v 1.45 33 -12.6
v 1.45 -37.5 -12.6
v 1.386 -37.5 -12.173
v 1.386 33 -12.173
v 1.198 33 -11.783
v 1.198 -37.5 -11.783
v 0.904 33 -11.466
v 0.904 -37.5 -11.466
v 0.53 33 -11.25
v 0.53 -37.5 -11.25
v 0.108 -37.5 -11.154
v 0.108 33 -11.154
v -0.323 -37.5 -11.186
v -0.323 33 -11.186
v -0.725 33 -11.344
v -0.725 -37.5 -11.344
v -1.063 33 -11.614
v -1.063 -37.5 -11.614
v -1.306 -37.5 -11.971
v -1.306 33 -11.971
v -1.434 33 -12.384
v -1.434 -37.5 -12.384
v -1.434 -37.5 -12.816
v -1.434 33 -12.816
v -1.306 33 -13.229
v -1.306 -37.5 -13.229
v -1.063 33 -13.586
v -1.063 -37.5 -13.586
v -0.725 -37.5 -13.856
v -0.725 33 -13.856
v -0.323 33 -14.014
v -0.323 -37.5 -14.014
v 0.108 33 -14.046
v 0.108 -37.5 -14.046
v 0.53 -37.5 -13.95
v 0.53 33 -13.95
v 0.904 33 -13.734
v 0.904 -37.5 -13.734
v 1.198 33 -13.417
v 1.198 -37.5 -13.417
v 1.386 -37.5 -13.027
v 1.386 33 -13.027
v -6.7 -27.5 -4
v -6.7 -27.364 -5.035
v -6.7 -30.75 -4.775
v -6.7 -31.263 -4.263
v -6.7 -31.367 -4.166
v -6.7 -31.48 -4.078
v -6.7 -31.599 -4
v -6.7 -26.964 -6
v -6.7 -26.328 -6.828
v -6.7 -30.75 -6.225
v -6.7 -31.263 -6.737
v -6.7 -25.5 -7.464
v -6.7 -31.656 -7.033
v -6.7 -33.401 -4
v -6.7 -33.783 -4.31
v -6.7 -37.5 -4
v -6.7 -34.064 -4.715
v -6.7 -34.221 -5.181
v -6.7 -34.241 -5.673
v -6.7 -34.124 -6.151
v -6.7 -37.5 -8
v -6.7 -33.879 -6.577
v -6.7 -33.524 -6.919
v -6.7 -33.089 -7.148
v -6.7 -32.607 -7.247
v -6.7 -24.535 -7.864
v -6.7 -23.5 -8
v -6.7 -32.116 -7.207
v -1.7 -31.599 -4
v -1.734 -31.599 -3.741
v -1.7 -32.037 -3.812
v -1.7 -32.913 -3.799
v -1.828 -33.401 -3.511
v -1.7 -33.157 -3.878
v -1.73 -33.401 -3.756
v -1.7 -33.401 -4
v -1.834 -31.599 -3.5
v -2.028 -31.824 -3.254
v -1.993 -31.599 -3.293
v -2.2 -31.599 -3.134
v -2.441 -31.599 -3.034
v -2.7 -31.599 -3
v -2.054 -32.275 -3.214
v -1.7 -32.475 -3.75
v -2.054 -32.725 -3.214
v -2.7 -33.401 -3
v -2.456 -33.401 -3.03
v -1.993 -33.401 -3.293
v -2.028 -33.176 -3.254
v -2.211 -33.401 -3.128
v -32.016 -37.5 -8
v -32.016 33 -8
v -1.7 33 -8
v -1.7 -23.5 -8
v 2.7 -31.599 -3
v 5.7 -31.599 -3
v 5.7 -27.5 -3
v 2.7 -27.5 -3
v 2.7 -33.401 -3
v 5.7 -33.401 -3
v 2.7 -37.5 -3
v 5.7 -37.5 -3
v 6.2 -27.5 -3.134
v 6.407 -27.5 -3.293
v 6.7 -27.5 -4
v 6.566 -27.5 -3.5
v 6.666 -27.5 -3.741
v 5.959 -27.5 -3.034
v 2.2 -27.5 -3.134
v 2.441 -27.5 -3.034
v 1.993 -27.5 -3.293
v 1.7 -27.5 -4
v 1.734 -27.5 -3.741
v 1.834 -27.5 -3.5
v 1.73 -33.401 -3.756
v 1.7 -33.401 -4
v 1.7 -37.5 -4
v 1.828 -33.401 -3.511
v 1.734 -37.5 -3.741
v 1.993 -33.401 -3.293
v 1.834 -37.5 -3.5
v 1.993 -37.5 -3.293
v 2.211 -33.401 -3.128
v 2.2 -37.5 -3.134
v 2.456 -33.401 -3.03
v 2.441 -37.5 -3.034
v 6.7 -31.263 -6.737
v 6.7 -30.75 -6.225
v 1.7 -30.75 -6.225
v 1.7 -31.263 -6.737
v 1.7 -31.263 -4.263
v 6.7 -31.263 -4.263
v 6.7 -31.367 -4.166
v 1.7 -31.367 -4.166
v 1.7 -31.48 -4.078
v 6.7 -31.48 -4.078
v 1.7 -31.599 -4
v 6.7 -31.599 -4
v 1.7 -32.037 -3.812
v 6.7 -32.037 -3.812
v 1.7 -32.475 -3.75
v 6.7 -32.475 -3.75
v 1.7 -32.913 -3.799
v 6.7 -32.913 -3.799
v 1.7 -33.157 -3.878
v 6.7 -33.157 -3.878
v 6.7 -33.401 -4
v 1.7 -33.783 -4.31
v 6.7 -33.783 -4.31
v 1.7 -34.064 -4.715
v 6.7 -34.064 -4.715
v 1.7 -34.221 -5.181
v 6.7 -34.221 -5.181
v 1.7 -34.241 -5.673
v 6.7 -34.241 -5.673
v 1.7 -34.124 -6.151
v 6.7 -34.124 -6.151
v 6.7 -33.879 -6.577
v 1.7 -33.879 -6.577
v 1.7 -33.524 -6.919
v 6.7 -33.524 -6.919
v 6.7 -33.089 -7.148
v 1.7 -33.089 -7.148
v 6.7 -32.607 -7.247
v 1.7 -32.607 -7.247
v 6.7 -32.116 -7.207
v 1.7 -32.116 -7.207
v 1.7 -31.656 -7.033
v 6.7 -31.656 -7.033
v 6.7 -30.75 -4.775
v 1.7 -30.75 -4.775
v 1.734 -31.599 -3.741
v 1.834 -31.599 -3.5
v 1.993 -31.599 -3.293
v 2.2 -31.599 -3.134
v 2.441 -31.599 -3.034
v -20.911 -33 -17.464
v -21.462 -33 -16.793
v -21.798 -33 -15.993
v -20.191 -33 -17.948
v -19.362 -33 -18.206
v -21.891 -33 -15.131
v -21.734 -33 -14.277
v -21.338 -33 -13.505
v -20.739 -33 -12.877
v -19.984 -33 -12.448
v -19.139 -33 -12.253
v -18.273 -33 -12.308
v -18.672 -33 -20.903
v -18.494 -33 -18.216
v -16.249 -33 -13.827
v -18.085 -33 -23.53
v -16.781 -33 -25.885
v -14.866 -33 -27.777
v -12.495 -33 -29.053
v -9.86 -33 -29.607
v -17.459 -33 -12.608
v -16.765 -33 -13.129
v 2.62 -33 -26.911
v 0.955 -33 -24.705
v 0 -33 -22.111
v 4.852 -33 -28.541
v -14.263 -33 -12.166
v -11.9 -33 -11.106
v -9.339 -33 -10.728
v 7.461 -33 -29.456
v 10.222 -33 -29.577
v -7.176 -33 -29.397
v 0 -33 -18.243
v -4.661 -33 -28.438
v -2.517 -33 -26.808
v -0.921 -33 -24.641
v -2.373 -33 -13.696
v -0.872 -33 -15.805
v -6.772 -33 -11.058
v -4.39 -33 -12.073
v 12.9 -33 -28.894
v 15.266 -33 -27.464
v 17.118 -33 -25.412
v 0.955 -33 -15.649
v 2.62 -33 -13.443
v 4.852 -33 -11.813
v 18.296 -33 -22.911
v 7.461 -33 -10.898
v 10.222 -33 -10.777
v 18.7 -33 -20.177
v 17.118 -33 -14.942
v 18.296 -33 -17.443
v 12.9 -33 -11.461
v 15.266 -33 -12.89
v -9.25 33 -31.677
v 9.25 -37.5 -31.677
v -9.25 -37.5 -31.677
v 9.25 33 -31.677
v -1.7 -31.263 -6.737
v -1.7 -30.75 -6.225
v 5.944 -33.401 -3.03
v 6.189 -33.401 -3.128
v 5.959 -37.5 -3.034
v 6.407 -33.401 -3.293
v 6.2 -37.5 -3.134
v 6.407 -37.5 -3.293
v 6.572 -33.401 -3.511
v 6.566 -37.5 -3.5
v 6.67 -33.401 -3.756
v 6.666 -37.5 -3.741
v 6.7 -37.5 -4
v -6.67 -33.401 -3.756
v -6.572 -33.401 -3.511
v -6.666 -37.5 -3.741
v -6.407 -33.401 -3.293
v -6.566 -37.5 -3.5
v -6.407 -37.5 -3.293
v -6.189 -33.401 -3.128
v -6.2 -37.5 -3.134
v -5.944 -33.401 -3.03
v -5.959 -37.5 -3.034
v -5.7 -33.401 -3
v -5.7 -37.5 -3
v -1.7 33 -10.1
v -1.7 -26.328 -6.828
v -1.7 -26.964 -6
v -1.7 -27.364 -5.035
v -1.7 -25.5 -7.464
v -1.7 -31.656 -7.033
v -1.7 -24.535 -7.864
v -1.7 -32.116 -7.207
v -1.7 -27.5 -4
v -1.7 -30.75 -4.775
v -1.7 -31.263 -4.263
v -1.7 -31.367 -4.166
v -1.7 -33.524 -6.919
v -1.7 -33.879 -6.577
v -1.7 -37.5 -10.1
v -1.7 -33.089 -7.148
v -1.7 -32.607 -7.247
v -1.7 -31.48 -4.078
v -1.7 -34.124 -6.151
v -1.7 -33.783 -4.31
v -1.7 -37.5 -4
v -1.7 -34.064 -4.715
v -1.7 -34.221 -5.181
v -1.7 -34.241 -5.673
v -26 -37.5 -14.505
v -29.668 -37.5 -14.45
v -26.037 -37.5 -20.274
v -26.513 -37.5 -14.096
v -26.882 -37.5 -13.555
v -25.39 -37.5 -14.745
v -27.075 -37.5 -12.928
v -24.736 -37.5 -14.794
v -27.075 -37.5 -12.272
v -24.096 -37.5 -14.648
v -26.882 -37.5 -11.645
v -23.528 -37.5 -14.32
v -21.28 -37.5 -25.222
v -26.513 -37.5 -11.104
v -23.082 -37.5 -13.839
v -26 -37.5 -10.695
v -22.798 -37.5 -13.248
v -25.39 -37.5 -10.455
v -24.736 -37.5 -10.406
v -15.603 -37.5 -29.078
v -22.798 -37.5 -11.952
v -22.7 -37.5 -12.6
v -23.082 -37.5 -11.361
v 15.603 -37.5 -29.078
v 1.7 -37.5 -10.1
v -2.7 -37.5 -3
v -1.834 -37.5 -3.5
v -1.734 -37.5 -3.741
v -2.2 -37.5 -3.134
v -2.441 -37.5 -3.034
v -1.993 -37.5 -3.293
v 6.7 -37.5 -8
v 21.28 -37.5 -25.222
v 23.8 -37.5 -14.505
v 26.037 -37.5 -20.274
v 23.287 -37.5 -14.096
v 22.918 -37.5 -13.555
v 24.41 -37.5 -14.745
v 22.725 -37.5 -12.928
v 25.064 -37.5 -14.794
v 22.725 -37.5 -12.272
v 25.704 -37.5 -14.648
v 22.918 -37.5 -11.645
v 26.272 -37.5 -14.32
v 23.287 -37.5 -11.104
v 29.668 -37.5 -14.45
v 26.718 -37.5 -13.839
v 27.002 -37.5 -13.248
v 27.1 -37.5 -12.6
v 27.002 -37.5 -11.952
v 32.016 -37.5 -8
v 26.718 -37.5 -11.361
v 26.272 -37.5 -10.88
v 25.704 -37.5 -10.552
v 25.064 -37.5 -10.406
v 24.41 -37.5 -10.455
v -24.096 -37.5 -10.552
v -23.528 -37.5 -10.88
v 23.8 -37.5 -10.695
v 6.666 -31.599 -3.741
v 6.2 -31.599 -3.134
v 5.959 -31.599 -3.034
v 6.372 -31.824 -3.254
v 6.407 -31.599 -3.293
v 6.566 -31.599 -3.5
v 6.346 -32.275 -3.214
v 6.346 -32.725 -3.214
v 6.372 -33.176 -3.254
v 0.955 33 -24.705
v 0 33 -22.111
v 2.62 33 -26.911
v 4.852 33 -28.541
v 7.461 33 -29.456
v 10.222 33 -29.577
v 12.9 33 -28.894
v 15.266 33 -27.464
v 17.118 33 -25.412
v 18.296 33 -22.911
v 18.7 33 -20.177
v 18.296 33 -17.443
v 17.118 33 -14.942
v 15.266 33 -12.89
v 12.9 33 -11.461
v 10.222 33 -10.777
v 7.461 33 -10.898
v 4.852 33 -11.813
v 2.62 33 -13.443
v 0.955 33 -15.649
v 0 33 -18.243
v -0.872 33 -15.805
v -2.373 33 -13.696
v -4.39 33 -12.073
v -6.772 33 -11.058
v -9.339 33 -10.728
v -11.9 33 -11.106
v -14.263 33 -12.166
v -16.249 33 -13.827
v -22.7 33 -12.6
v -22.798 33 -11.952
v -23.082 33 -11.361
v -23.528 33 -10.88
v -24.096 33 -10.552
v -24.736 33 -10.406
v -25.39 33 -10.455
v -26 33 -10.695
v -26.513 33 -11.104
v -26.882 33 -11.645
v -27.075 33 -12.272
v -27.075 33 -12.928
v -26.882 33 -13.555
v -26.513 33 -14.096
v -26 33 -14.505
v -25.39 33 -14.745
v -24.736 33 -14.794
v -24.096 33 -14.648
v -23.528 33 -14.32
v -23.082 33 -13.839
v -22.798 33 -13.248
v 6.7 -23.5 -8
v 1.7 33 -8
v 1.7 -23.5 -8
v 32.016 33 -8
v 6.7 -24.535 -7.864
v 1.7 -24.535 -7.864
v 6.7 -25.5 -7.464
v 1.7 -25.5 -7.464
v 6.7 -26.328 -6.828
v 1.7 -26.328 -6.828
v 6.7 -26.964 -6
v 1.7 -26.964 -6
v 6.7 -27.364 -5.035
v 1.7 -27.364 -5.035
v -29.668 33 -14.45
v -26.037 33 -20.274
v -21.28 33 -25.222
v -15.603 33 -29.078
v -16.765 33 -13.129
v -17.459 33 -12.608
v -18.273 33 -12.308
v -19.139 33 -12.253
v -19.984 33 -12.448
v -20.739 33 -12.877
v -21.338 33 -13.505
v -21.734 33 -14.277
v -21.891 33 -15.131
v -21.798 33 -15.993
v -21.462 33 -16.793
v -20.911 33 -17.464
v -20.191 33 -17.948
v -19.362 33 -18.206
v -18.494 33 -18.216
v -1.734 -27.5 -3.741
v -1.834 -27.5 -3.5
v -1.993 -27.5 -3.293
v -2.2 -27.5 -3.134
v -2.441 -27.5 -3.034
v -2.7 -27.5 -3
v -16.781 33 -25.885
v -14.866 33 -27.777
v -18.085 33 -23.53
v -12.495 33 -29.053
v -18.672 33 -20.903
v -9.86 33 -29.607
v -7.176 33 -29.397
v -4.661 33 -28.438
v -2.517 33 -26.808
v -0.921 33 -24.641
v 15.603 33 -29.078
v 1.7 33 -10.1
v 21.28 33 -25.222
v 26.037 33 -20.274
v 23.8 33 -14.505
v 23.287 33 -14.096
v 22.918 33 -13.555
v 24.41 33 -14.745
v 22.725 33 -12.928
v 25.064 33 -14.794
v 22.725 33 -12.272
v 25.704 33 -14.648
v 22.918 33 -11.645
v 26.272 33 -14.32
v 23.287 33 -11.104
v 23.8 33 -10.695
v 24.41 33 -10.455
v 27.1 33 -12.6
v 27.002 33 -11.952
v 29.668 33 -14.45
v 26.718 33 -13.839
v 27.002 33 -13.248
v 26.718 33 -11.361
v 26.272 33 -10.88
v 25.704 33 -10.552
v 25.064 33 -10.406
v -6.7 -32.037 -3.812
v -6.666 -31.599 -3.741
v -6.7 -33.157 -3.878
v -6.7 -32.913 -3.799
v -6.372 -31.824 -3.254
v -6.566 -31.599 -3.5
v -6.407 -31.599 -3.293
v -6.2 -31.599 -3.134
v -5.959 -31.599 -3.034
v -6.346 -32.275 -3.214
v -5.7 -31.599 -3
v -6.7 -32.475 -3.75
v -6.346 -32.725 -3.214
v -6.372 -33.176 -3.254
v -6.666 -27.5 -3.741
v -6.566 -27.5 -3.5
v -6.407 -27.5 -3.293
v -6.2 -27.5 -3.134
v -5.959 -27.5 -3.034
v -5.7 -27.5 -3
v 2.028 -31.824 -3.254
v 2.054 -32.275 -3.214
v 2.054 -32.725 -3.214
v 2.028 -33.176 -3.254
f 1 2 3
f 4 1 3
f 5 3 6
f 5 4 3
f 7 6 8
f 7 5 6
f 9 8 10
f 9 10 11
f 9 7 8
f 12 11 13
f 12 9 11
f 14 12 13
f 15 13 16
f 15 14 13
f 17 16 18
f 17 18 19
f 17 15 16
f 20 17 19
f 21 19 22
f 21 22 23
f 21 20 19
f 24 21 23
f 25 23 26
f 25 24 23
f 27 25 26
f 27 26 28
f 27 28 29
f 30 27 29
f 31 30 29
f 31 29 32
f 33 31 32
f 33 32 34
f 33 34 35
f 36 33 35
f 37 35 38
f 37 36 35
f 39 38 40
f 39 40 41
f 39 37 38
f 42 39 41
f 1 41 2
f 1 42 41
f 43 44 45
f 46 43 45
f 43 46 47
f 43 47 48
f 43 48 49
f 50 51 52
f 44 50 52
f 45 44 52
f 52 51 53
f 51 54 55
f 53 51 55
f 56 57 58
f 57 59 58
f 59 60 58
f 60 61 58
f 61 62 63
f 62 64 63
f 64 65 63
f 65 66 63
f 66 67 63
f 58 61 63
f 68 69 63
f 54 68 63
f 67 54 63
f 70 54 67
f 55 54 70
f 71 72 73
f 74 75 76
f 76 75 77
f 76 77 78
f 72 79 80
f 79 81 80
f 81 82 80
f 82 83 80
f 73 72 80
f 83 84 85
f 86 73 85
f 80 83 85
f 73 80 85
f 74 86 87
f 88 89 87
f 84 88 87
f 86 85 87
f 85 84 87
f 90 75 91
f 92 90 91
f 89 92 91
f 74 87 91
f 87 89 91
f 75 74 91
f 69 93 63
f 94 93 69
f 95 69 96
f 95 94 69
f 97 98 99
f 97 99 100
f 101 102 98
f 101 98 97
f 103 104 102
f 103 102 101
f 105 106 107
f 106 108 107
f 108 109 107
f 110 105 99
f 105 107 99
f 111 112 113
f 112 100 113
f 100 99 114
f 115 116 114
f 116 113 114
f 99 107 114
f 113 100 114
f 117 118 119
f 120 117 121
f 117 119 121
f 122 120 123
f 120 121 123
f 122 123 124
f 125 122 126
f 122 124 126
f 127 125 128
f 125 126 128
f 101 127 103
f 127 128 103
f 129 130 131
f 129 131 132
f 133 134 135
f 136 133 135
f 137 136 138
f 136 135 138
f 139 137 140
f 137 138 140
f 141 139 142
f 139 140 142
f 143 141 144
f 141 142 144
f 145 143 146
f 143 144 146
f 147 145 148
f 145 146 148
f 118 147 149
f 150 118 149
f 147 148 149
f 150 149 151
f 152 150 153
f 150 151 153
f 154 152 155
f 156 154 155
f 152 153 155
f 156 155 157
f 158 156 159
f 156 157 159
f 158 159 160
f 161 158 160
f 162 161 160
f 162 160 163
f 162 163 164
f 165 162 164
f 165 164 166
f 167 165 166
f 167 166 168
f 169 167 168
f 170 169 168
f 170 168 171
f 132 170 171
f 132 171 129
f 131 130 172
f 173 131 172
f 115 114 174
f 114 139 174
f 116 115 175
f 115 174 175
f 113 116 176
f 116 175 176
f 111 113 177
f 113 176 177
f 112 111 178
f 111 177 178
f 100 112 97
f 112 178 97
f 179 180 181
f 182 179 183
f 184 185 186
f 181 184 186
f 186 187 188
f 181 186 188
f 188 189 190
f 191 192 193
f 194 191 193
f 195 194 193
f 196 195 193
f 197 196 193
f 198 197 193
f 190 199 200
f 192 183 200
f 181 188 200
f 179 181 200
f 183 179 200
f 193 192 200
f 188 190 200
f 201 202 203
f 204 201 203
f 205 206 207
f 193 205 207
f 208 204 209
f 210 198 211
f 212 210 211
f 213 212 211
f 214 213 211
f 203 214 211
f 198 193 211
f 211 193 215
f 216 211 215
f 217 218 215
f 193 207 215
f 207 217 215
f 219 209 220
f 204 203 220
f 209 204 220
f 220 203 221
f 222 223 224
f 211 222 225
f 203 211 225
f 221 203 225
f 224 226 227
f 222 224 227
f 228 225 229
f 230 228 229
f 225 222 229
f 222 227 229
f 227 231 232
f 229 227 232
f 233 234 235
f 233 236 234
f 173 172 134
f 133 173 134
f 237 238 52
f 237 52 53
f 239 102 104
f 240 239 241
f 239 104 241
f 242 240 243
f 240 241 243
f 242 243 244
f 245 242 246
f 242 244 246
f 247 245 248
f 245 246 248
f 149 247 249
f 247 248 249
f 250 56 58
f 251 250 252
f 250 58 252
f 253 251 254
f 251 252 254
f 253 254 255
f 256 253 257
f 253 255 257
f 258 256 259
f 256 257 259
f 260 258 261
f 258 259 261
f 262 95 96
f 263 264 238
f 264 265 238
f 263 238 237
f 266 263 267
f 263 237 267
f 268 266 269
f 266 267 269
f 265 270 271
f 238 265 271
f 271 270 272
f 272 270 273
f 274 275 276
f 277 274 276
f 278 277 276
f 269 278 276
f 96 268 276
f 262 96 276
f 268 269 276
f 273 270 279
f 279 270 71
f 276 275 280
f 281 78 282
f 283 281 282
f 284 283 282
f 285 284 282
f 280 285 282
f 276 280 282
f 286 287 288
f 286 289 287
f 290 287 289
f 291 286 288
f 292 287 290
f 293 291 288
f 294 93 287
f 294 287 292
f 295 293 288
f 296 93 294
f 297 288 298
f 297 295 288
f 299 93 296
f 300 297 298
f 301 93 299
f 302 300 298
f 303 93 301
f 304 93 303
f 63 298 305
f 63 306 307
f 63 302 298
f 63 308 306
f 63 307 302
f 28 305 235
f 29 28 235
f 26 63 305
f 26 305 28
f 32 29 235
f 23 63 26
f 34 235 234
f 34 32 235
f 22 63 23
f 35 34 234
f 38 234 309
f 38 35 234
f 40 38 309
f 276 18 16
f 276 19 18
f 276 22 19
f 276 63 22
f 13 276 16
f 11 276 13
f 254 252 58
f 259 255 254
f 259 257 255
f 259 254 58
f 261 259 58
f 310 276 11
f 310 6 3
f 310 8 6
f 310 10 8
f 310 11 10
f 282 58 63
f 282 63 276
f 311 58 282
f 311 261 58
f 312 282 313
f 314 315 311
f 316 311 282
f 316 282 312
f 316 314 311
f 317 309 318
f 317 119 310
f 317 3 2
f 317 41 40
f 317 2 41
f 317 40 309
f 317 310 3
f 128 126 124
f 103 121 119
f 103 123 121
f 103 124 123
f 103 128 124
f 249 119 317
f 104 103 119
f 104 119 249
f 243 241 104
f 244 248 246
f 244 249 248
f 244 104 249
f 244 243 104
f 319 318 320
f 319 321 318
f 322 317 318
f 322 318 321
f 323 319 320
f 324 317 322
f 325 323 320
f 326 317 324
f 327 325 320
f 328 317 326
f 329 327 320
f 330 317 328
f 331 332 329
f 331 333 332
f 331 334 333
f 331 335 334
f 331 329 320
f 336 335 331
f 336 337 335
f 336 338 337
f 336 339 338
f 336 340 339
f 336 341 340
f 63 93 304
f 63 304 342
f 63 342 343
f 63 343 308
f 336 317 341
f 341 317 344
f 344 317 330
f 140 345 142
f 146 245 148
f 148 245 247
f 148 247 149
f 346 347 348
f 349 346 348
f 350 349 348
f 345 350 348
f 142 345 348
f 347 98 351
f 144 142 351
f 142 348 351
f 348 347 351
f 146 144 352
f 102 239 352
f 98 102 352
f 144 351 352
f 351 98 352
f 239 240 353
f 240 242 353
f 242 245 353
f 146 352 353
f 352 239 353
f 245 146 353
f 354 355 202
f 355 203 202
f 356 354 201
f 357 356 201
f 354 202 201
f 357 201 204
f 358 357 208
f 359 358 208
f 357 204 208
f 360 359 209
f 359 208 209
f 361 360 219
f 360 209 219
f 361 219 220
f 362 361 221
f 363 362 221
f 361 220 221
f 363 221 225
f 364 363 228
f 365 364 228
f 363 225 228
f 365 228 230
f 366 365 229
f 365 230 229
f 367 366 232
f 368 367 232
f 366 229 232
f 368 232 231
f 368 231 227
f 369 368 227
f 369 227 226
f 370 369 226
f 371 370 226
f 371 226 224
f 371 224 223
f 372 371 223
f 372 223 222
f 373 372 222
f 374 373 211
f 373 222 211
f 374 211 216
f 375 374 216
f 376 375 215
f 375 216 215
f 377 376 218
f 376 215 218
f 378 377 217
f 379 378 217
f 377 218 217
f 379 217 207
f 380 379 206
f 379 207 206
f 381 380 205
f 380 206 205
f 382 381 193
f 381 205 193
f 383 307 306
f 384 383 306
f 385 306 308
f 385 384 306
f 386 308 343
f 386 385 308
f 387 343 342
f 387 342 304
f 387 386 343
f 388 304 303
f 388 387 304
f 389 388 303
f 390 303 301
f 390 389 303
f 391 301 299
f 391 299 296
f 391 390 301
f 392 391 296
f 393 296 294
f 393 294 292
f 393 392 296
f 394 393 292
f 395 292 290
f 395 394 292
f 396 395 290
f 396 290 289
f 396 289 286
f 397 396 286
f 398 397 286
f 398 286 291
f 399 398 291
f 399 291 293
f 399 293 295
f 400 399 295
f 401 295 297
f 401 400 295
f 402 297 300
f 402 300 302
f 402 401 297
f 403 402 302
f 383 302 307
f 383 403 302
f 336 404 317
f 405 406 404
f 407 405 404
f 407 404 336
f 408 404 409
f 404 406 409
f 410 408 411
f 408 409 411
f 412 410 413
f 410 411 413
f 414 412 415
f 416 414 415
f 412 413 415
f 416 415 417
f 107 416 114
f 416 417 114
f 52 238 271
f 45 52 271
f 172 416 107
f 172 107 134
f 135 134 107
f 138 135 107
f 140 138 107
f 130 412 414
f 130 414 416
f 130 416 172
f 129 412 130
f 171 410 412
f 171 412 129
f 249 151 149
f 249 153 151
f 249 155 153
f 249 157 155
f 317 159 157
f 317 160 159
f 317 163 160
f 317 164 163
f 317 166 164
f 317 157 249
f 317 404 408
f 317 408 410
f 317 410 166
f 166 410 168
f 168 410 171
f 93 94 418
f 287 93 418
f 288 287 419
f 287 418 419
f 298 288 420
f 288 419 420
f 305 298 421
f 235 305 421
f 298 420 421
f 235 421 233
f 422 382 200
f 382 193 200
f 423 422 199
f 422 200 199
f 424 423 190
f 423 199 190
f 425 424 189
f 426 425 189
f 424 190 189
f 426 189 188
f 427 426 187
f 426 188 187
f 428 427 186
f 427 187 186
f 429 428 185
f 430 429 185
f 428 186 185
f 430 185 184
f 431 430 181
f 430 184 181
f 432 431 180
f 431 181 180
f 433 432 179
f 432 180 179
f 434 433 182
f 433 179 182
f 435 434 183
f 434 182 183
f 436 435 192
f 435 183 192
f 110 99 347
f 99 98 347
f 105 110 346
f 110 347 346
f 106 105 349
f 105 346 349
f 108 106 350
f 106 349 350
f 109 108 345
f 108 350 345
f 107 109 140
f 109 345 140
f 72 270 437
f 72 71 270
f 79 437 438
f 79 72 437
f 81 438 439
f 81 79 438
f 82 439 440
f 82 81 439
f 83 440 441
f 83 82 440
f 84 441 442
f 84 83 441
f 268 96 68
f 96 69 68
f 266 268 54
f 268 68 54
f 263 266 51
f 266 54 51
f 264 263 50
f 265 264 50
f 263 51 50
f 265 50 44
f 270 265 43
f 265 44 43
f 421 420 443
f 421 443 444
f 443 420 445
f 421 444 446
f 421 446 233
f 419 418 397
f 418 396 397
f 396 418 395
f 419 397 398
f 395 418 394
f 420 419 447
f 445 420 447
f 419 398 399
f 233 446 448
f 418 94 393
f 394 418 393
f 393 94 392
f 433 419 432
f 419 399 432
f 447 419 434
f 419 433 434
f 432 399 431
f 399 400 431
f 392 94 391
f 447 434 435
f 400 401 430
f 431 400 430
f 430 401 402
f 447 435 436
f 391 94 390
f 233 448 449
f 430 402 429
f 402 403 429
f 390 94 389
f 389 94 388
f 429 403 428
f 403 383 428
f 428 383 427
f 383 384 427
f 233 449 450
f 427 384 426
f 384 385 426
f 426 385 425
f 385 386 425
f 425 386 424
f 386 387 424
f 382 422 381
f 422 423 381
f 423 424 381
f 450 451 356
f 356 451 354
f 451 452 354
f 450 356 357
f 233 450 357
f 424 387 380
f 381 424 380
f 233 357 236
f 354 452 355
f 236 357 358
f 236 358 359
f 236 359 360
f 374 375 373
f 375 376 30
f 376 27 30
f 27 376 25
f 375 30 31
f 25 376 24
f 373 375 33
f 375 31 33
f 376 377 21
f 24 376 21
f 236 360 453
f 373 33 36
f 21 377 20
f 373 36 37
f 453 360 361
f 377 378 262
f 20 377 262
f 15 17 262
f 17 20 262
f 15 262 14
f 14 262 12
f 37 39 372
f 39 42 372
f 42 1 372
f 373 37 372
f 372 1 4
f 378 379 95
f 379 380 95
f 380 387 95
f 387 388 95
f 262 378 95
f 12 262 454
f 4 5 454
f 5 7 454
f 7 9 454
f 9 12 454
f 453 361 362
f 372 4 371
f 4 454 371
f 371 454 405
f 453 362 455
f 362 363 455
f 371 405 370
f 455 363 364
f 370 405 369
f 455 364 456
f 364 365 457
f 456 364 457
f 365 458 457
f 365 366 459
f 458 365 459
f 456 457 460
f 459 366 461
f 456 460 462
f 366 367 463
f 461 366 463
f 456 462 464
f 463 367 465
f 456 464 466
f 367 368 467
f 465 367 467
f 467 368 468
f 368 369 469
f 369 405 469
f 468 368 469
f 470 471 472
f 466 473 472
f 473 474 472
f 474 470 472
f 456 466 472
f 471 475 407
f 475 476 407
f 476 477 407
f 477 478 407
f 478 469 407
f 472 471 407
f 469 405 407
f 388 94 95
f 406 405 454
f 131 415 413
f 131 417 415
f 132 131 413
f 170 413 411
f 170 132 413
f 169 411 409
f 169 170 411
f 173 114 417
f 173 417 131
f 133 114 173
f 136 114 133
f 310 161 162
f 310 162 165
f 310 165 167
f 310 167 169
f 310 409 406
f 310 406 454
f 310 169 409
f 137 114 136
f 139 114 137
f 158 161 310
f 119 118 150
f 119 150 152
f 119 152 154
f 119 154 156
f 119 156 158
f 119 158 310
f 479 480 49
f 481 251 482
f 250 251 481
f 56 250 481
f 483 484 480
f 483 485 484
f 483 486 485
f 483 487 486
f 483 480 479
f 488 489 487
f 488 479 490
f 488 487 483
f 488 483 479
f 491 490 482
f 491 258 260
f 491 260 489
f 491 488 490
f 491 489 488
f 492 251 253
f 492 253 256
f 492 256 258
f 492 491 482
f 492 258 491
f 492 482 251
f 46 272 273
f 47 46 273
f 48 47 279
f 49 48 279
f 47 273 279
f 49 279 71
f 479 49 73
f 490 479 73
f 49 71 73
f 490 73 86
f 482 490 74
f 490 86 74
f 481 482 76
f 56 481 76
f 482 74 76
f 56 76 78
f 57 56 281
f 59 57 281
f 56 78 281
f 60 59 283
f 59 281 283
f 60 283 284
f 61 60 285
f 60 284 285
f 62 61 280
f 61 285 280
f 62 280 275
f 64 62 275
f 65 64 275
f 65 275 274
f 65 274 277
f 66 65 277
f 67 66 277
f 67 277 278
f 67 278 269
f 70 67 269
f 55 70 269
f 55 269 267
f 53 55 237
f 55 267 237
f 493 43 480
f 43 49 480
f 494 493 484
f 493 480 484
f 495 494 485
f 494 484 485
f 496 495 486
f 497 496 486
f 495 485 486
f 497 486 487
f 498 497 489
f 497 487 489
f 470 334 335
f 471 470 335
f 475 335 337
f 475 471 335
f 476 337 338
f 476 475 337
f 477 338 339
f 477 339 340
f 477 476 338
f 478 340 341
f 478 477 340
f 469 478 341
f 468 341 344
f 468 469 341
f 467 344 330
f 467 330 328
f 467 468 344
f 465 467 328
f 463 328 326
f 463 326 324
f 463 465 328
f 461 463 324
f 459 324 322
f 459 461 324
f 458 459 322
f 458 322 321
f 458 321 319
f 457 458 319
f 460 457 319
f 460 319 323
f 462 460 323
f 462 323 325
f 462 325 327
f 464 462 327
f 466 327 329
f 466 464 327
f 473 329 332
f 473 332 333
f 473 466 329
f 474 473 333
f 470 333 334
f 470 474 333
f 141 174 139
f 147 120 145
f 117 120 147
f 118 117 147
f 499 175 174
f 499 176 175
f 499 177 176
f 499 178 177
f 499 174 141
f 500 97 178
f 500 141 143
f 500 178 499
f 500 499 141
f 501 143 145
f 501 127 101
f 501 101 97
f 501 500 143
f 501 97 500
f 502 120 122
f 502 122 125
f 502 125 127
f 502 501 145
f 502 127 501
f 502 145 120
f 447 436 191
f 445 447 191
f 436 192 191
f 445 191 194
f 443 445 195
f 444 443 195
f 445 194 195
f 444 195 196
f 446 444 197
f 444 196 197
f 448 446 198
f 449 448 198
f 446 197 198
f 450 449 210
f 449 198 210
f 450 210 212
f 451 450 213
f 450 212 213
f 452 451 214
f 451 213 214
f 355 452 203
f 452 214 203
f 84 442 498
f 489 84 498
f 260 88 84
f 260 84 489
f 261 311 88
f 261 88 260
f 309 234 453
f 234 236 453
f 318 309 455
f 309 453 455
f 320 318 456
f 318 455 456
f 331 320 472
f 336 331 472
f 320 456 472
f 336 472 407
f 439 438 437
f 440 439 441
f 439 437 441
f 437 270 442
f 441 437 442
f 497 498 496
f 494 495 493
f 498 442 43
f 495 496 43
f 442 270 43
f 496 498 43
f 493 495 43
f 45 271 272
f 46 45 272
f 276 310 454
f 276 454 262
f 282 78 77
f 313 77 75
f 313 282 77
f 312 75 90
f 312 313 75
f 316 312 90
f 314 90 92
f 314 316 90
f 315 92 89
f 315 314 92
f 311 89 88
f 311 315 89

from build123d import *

# Parameters (mm, degrees)
SKETCH_R        = 2.2
SKETCH_R_2      = 1.45
PAD_DEPTH       = 33
SKETCH037_R     = 2.2
SKETCH037_R_2   = 1.45
PAD016_DEPTH    = 4.5
SKETCH039_W     = 13.4
SKETCH039_H     = 10
PAD017_DEPTH    = 5
POCKET018_DEPTH = 13.4
SKETCH041_W     = 3.4
SKETCH041_H     = 70.5
POCKET019_DEPTH = 7.1
FILLET006_R     = 1
FILLET007_R     = 4


with BuildPart() as part:
    # Sketch → Pad (new body, symmetric)
    with BuildSketch(Plane.XZ):
        with BuildLine():
            Line((-9.25, -31.677082), (9.25, -31.677082))
            ThreePointArc((9.25, -31.677082), (23.787894, -22.872168), (32.015621, -8))
            Line((-32.015621, -8), (32.015621, -8))
            ThreePointArc((-32.015621, -8), (-23.787894, -22.872168), (-9.25, -31.677082))
        make_face()
        with Locations((24.9, -12.6)):
            Circle(SKETCH_R, mode=Mode.SUBTRACT)
        with Locations((-24.9, -12.6)):
            Circle(SKETCH_R, mode=Mode.SUBTRACT)
        with Locations((0, -12.6)):
            Circle(SKETCH_R_2, mode=Mode.SUBTRACT)
        with BuildLine():
            ThreePointArc((0, -18.243174), (-6.771568, -11.057878), (-16.248592, -13.827105))
            ThreePointArc((-16.248592, -13.827105), (-21.564175, -13.876493), (-18.494342, -18.216307))
            ThreePointArc((-18.494342, -18.216307), (-11.197344, -29.424262), (0, -22.11099))
            ThreePointArc((0, -22.11099), (18.7, -20.177082), (0, -18.243174))
        make_face(mode=Mode.SUBTRACT)
    extrude(amount=PAD_DEPTH, both=True)

    # Sketch037 (on Face13 of Pad) → Pad016 (join)
    with BuildSketch(Plane.XZ.offset(33)):
        with BuildLine():
            ThreePointArc((-32.015621, -8), (-23.787894, -22.872168), (-9.25, -31.677082))
            Line((9.25, -31.677082), (-9.25, -31.677082))
            ThreePointArc((9.25, -31.677082), (23.787894, -22.872168), (32.015621, -8))
            Line((-32.015621, -8), (32.015621, -8))
        make_face()
        with Locations((-24.9, -12.6)):
            Circle(SKETCH037_R, mode=Mode.SUBTRACT)
        with Locations((0, -12.6)):
            Circle(SKETCH037_R_2, mode=Mode.SUBTRACT)
        with Locations((24.9, -12.6)):
            Circle(SKETCH037_R, mode=Mode.SUBTRACT)
    extrude(amount=PAD016_DEPTH)

    # Sketch039 → Pad017 (join)
    with BuildSketch(Plane(origin=(0, 0, -8), x_dir=(-1, 0, 0), z_dir=(0, 0, 1))):
        with Locations((0, 32.5)):
            Rectangle(SKETCH039_W, SKETCH039_H)
    extrude(amount=PAD017_DEPTH)

    # Sketch040 (on Face8 of Pad017) → Pocket018 (cut)
    with BuildSketch(Plane(origin=(6.7, 0, 0), x_dir=(0, 0, 1), z_dir=(1, 0, 0))):
        with BuildLine():
            Line((-6.224874, 30.75), (-4.775126, 30.75))
            Line((-4.775126, 30.75), (-4.262563, 31.262563))
            ThreePointArc((-4.262563, 31.262563), (-5.5, 34.25), (-6.737437, 31.262563))
            Line((-6.224874, 30.75), (-6.737437, 31.262563))
        make_face()
    extrude(amount=-POCKET018_DEPTH, mode=Mode.SUBTRACT)

    # Sketch041 (on Face22 of Pocket018) → Pocket019 (cut)
    with BuildSketch(Plane(origin=(0, 0, -3), x_dir=(-1, 0, 0), z_dir=(0, 0, 1))):
        with Locations((0, 2.25)):
            Rectangle(SKETCH041_W, SKETCH041_H)
    extrude(amount=-POCKET019_DEPTH, mode=Mode.SUBTRACT)

    # Fillet006
    fillet006_edges = [part.edges().sort_by_distance(p)[0] for p in [
        (6.7, -32.5, -3),
        (1.7, -32.5, -3),
        (-1.7, -32.5, -3),
        (-6.7, -32.5, -3),
    ]]
    fillet(fillet006_edges, radius=FILLET006_R)

    # Fillet007
    fillet007_edges = [part.edges().sort_by_distance(p)[0] for p in [
        (-4.2, -27.5, -8),
        (4.2, -27.5, -8),
    ]]
    fillet(fillet007_edges, radius=FILLET007_R)


solid = part.part
